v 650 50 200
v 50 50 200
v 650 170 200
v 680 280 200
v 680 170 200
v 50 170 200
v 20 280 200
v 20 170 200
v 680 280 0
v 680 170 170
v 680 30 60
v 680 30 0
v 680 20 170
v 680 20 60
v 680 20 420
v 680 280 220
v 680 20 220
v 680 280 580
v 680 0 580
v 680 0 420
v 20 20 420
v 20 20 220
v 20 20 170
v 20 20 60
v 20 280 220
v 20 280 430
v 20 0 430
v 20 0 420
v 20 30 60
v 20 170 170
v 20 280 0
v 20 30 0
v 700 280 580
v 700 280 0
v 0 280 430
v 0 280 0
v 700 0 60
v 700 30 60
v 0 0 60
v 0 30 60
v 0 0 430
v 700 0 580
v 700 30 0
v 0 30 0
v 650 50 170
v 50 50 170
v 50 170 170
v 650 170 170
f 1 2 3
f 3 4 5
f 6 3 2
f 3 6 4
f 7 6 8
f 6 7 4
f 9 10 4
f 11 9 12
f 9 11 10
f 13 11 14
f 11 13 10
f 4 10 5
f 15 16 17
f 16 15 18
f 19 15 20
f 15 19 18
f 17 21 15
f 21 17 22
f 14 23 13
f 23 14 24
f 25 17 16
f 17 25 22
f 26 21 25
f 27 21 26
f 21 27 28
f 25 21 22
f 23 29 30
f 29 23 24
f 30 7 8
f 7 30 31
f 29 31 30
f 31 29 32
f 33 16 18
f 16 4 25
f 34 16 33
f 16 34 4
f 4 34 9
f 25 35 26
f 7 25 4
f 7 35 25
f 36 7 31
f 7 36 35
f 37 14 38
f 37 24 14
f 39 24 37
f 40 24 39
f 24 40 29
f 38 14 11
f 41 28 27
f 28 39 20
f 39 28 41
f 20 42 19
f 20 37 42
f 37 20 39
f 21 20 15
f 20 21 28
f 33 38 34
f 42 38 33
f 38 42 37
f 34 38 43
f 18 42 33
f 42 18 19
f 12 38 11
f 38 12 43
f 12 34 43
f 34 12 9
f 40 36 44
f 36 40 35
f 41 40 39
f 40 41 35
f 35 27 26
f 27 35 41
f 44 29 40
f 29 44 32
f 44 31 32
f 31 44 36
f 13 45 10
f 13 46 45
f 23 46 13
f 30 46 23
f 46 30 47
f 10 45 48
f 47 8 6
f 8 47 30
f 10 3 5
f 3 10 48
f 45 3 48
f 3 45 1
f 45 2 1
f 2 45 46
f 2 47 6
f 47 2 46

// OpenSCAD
// Generated by Parametrix
ca_ushelf_faceFace_000 = [ [ 20.0000, 60.0000 ],[ 680.0000, 60.0000 ],[ 680.0000, 420.0000 ],[ 20.0000, 420.0000 ],[ 20.0000, 60.0000 ] ];
cb_ushelf_faceFace_000 = [  0, 1, 2, 3, 4 ];
a_ushelf_faceFace = concat(ca_ushelf_faceFace_000);
b_ushelf_faceFace = [cb_ushelf_faceFace_000];
ca_ushelf_faceSide_000 = [ [ 280.0000, 0.0000 ],[ 280.0000, 580.0000 ],[ 0.0000, 580.0000 ],[ 0.0000, 60.0000 ],[ 30.0000, 60.0000 ],[ 30.0000, 0.0000 ],[ 280.0000, 0.0000 ] ];
cb_ushelf_faceSide_000 = [  0, 1, 2, 3, 4, 5, 6 ];
a_ushelf_faceSide = concat(ca_ushelf_faceSide_000);
b_ushelf_faceSide = [cb_ushelf_faceSide_000];
ca_ushelf_faceSideR_000 = [ [ 280.0000, 0.0000 ],[ 280.0000, 430.0000 ],[ 0.0000, 430.0000 ],[ 0.0000, 60.0000 ],[ 30.0000, 60.0000 ],[ 30.0000, 0.0000 ],[ 280.0000, 0.0000 ] ];
cb_ushelf_faceSideR_000 = [  0, 1, 2, 3, 4, 5, 6 ];
a_ushelf_faceSideR = concat(ca_ushelf_faceSideR_000);
b_ushelf_faceSideR = [cb_ushelf_faceSideR_000];
ca_ushelf_faceTop_000 = [ [ 20.0000, 20.0000 ],[ 680.0000, 20.0000 ],[ 680.0000, 280.0000 ],[ 20.0000, 280.0000 ],[ 20.0000, 20.0000 ] ];
cb_ushelf_faceTop_000 = [  0, 1, 2, 3, 4 ];
a_ushelf_faceTop = concat(ca_ushelf_faceTop_000);
b_ushelf_faceTop = [cb_ushelf_faceTop_000];
ca_ushelf_faceBeamTop_000 = [ [ 20.0000, 20.0000 ],[ 50.0000, 20.0000 ],[ 50.0000, 170.0000 ],[ 20.0000, 170.0000 ],[ 20.0000, 20.0000 ] ];
cb_ushelf_faceBeamTop_000 = [  0, 1, 2, 3, 4 ];
ca_ushelf_faceBeamTop_001 = [ [ 650.0000, 20.0000 ],[ 680.0000, 20.0000 ],[ 680.0000, 170.0000 ],[ 650.0000, 170.0000 ],[ 650.0000, 20.0000 ] ];
cb_ushelf_faceBeamTop_001 = [  5, 6, 7, 8, 9 ];
ca_ushelf_faceBeamTop_002 = [ [ 50.0000, 20.0000 ],[ 650.0000, 20.0000 ],[ 650.0000, 50.0000 ],[ 50.0000, 50.0000 ],[ 50.0000, 20.0000 ] ];
cb_ushelf_faceBeamTop_002 = [  10, 11, 12, 13, 14 ];
a_ushelf_faceBeamTop = concat(ca_ushelf_faceBeamTop_000, ca_ushelf_faceBeamTop_001, ca_ushelf_faceBeamTop_002);
b_ushelf_faceBeamTop = [cb_ushelf_faceBeamTop_000, cb_ushelf_faceBeamTop_001, cb_ushelf_faceBeamTop_002];

module subpax_ushelf_plateau () {
	translate( [ 0, 0, 200 ])
		rotate( [ 0, 0, 0 ])
			   linear_extrude(height = 20) polygon(a_ushelf_faceTop, b_ushelf_faceTop);
}

module subpax_ushelf_back () {
	translate( [ 0, 20, 0 ])
		rotate( [ 90, 0, 0 ])
			   linear_extrude(height = 20) polygon(a_ushelf_faceFace, b_ushelf_faceFace);
}

module subpax_ushelf_sideL () {
	translate( [ 680, 0, 0 ])
		rotate( [ 90, 0, 90 ])
			   linear_extrude(height = 20) polygon(a_ushelf_faceSide, b_ushelf_faceSide);
}

module subpax_ushelf_sideR () {
	translate( [ 0, 0, 0 ])
		rotate( [ 90, 0, 90 ])
			   linear_extrude(height = 20) polygon(a_ushelf_faceSideR, b_ushelf_faceSideR);
}

module subpax_ushelf_beam () {
	translate( [ 0, 0, 170 ])
		rotate( [ 0, 0, 0 ])
			   linear_extrude(height = 30) polygon(a_ushelf_faceBeamTop, b_ushelf_faceBeamTop);
}

module pax_ushelf () {
	union () {
		subpax_ushelf_plateau();
subpax_ushelf_back();
subpax_ushelf_sideL();
subpax_ushelf_sideR();
subpax_ushelf_beam();
	}
}

pax_ushelf();
